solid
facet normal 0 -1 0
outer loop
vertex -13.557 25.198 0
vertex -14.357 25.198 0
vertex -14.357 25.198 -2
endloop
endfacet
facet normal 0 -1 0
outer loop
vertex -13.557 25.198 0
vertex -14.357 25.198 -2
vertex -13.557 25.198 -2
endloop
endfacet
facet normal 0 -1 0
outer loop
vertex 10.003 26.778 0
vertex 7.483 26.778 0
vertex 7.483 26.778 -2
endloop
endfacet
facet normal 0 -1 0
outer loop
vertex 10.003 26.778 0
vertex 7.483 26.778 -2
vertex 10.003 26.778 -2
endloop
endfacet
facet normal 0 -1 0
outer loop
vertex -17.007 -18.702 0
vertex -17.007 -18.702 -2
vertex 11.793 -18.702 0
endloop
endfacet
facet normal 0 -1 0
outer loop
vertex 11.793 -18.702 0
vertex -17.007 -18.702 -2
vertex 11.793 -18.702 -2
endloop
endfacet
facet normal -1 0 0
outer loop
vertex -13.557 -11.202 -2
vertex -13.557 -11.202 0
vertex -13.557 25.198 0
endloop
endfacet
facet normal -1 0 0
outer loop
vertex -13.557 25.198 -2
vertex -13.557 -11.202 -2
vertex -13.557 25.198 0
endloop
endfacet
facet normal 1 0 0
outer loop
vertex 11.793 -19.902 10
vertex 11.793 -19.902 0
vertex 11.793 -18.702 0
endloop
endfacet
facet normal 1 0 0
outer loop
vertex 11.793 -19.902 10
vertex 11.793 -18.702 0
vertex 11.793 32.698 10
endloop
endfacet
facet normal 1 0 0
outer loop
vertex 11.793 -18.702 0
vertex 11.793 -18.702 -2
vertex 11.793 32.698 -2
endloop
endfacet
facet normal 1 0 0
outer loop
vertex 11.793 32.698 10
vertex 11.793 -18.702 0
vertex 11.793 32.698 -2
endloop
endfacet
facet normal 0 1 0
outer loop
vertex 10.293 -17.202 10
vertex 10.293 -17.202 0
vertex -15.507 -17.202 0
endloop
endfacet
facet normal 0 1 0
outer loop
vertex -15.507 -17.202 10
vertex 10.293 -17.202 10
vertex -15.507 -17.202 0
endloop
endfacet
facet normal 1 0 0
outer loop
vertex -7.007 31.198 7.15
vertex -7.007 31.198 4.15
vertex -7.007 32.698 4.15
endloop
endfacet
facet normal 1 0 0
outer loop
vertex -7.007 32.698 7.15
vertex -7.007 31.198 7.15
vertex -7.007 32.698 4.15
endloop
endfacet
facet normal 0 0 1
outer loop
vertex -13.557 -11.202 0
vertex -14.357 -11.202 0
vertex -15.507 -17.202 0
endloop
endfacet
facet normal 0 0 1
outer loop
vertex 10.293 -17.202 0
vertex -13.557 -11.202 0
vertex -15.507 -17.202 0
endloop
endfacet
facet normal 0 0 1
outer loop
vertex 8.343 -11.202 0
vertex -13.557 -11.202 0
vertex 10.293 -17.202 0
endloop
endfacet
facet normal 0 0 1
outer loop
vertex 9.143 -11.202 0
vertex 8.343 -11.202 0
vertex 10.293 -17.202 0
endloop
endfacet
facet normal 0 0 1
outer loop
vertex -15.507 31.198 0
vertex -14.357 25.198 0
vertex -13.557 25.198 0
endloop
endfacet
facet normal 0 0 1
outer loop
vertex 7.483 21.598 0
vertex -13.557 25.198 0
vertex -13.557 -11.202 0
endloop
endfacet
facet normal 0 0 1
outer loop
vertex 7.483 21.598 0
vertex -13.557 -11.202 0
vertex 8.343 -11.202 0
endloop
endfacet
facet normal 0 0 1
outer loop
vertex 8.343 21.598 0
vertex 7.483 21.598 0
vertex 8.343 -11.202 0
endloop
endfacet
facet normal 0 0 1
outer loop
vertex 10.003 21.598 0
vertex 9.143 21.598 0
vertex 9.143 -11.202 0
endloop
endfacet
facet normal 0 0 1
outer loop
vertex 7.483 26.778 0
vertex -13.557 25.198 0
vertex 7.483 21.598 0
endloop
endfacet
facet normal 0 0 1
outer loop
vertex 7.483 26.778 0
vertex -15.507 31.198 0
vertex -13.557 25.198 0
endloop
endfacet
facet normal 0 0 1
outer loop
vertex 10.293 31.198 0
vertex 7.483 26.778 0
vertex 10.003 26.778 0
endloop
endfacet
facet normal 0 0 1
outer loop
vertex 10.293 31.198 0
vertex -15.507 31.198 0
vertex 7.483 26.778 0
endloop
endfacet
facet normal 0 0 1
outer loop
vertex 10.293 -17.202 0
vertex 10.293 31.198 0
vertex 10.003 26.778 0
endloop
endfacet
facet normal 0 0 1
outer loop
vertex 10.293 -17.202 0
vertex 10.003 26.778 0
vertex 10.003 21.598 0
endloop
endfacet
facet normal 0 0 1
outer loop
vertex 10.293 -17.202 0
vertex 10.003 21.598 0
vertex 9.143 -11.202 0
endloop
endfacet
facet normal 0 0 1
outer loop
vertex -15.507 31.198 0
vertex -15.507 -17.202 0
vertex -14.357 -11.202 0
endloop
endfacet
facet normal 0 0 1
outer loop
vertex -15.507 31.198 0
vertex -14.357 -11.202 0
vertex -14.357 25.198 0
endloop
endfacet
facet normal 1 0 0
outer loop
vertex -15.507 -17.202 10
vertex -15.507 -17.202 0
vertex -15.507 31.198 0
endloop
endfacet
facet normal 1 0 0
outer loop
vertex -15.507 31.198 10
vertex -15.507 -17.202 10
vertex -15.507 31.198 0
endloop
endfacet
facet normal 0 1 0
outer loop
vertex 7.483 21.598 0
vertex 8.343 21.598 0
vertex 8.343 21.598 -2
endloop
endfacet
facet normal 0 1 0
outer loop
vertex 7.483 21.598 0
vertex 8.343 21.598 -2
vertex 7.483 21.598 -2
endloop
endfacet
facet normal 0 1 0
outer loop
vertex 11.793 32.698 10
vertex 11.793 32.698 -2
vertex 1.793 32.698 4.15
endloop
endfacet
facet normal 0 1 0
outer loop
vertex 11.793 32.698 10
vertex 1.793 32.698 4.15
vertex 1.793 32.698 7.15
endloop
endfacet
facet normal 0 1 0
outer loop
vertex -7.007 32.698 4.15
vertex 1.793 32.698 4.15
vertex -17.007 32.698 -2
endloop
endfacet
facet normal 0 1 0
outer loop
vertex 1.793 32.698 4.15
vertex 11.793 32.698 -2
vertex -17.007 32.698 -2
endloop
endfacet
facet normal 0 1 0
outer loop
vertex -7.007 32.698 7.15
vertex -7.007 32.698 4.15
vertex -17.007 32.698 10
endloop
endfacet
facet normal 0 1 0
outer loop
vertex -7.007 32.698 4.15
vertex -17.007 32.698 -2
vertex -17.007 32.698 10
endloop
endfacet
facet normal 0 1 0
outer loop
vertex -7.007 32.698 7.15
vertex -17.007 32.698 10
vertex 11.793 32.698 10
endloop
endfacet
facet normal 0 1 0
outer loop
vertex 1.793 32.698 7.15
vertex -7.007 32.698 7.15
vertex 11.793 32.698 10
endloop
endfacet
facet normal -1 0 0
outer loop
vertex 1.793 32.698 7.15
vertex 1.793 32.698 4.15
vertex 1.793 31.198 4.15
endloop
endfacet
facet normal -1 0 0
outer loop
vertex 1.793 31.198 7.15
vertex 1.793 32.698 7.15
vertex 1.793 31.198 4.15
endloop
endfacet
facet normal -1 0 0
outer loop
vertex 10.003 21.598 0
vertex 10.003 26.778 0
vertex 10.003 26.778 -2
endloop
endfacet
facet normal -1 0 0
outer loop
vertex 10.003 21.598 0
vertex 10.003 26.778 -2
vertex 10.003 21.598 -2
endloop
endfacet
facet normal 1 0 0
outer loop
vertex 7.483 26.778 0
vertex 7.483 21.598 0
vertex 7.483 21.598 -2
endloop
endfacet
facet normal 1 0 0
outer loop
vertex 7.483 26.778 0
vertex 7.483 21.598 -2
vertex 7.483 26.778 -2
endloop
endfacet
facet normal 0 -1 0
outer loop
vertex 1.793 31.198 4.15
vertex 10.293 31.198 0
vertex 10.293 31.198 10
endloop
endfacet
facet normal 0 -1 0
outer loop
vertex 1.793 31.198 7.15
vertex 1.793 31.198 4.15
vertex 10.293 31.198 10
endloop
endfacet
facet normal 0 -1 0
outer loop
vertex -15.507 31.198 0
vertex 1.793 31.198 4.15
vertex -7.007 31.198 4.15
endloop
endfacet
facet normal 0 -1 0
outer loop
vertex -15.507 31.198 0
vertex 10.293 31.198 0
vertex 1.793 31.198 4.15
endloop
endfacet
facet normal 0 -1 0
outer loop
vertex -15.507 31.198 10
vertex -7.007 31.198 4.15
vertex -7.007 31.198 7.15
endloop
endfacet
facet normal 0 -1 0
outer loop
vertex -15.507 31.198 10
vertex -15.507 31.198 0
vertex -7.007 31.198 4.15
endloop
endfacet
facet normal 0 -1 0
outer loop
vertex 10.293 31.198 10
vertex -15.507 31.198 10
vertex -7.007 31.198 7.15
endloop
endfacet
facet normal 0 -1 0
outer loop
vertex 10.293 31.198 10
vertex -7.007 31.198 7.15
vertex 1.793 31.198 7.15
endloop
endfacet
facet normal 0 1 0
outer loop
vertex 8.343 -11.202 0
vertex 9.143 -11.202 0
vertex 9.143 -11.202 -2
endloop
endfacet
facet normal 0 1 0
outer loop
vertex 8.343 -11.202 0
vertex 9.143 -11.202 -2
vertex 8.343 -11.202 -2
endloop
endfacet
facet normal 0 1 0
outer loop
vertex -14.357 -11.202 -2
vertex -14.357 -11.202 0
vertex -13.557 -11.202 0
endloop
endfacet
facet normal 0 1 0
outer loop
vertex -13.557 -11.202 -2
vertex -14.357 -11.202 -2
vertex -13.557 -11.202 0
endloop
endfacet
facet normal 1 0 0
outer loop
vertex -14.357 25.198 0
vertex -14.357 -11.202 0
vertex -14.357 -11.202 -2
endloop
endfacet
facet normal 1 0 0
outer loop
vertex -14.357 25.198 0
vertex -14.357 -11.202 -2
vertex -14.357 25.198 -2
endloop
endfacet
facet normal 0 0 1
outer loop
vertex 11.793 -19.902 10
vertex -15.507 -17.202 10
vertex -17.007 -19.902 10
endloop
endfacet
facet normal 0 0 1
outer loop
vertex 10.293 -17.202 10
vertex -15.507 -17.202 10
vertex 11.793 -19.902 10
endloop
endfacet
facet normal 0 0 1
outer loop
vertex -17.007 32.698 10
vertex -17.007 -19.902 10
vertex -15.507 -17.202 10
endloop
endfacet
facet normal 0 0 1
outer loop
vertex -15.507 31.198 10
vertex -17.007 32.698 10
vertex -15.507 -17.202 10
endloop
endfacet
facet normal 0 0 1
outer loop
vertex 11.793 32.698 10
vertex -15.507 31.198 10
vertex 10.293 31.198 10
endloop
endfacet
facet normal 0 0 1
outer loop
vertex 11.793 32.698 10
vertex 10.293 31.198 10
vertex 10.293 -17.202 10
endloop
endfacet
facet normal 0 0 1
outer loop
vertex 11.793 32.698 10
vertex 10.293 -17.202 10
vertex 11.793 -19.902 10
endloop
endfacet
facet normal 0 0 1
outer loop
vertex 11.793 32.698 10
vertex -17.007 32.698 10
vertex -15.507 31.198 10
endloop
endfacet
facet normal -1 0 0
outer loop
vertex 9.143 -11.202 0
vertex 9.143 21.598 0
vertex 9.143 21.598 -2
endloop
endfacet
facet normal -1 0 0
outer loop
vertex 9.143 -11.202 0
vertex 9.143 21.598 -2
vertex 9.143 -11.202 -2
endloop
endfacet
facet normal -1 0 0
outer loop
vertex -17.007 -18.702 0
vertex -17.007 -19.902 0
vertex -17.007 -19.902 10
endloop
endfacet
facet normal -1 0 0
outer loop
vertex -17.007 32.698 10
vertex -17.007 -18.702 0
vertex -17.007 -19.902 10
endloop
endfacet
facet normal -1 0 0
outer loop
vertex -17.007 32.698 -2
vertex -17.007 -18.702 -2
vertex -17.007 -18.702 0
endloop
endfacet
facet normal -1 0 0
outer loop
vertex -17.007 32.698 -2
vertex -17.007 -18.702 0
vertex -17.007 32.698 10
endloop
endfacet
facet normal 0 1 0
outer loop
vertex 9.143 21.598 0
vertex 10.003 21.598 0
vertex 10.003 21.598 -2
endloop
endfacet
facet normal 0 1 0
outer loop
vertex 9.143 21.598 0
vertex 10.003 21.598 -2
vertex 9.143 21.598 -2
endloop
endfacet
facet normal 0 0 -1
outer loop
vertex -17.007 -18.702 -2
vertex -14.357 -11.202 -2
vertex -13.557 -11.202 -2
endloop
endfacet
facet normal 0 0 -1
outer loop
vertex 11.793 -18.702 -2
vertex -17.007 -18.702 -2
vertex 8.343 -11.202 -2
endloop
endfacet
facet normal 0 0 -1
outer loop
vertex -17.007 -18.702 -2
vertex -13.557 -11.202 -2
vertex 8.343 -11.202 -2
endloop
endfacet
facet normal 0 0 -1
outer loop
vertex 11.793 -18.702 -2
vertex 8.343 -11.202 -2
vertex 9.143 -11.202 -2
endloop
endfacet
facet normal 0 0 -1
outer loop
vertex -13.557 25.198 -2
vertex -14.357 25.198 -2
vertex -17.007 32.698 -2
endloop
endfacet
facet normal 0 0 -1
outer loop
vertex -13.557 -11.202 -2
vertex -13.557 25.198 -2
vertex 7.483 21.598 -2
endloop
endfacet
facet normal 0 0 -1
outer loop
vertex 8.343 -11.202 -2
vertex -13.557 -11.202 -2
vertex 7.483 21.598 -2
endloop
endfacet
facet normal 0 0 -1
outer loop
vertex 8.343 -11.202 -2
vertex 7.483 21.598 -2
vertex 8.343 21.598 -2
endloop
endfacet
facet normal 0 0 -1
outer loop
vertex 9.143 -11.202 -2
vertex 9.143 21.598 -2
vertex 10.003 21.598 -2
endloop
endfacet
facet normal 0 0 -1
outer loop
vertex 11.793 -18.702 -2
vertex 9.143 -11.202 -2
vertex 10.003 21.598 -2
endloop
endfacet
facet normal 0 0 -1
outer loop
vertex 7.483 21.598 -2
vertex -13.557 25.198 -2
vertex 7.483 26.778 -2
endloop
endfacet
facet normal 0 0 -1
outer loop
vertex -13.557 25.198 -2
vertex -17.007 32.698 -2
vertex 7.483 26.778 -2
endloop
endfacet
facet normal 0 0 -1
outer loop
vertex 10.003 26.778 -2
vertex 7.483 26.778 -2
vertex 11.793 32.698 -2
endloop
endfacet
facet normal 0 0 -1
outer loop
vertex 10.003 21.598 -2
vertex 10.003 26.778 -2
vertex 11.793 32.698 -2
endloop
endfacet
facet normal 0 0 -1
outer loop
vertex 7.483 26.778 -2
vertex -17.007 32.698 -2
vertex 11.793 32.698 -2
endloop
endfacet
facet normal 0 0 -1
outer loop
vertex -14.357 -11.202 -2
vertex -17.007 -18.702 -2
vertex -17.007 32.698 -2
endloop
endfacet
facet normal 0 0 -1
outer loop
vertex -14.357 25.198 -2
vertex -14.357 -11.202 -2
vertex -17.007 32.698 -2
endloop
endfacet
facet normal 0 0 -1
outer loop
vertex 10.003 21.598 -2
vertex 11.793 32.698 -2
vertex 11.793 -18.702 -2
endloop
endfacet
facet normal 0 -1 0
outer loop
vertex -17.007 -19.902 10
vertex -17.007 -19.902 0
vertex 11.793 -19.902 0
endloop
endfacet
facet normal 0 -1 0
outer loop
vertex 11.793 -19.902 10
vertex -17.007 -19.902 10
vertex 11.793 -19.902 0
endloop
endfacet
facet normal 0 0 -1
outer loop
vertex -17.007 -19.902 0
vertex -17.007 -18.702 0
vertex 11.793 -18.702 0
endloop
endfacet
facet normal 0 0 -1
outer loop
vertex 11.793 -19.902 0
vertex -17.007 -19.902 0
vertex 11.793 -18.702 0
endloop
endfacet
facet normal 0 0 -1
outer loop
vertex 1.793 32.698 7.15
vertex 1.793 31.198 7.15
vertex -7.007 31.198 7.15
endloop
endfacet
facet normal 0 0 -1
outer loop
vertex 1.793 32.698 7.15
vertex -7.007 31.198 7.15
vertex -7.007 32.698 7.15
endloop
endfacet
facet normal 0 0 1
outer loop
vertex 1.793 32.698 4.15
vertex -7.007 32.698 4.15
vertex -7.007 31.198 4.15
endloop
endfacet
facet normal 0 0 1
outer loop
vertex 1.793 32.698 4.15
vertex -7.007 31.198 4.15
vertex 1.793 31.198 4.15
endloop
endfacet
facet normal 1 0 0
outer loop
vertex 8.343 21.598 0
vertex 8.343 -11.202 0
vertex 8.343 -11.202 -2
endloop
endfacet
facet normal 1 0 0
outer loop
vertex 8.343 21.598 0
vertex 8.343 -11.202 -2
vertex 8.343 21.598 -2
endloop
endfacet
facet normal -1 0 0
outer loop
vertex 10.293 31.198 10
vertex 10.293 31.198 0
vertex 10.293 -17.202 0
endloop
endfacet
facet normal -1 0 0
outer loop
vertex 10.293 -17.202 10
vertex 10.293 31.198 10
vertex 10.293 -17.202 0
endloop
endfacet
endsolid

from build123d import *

# Parameters (mm, degrees)
F0_W     = 0.8
F0_H     = 36.4
F0_W_2   = 8.8
F0_H_2   = 1.5
F1_DEPTH = 2
F2_DEPTH = 10
F3_DEPTH = 4.15
F0_H_3   = 3.6
F4_DEPTH = 2
F5_W     = 1.5
F5_H     = 2.85
F6_DEPTH = 8.8
F0_W_3   = 28.8
F0_H_4   = 1.2
F7_DEPTH = 10


with BuildPart() as f1:
    # F0 (on Top) → F1 (new body)
    with BuildSketch(Plane.XY):
        Polygon((-15.506923, -17.20208), (-15.506923, 31.19792), (-7.006923, 31.19792), (-7.006923, 32.69792), (-17.006923, 32.69792), (-17.006923, -18.70208), (11.793077, -18.70208), (11.793077, 32.69792), (1.793077, 32.69792), (1.793077, 31.19792), (10.293077, 31.19792), (10.293077, -17.20208), align=None)
        Polygon((-7.006923, 31.19792), (-15.506923, 31.19792), (-15.506923, -17.20208), (10.293077, -17.20208), (10.293077, 31.19792), (1.793077, 31.19792), align=None)
        with Locations((-13.956923, 6.99792)):
            Rectangle(F0_W, F0_H, mode=Mode.SUBTRACT)
        Polygon((8.343077, -11.20208), (8.343077, 21.59792), (7.483077, 21.59792), (7.483077, 26.77792), (8.743077, 26.77792), (10.003077, 26.77792), (10.003077, 21.59792), (9.143077, 21.59792), (9.143077, -11.20208), align=None, mode=Mode.SUBTRACT)
        with Locations((-2.606923, 31.94792)):
            Rectangle(F0_W_2, F0_H_2)
    extrude(amount=-F1_DEPTH)

    # F0 (on Top) → F2 (join)
    with BuildSketch(Plane.XY):
        Polygon((-15.506923, -17.20208), (-15.506923, 31.19792), (-7.006923, 31.19792), (-7.006923, 32.69792), (-17.006923, 32.69792), (-17.006923, -18.70208), (11.793077, -18.70208), (11.793077, 32.69792), (1.793077, 32.69792), (1.793077, 31.19792), (10.293077, 31.19792), (10.293077, -17.20208), align=None)
    extrude(amount=F2_DEPTH)

    # F0 (on Top) → F3 (join)
    with BuildSketch(Plane.XY):
        with Locations((-2.606923, 31.94792)):
            Rectangle(F0_W_2, F0_H_2)
    extrude(amount=F3_DEPTH)

    # F0 (on Top) → F4 (cut)
    with BuildSketch(Plane.XY):
        with Locations((-13.956923, 6.99792)):
            Rectangle(F0_W, F0_H)
        with Locations((8.743077, 23.39792)):
            Rectangle(F0_W, F0_H_3)
    extrude(amount=-F4_DEPTH, mode=Mode.SUBTRACT)

    # F5 (on face) → F6 (join)
    with BuildSketch(Plane.YZ.offset(-7.006923)):
        with Locations((31.94792, 8.575)):
            Rectangle(F5_W, F5_H)
    extrude(amount=F6_DEPTH)

    # F0 (on Top) → F7 (join)
    with BuildSketch(Plane.XY):
        with Locations((-2.606923, -19.30208)):
            Rectangle(F0_W_3, F0_H_4)
    extrude(amount=F7_DEPTH)


solid = f1.part
